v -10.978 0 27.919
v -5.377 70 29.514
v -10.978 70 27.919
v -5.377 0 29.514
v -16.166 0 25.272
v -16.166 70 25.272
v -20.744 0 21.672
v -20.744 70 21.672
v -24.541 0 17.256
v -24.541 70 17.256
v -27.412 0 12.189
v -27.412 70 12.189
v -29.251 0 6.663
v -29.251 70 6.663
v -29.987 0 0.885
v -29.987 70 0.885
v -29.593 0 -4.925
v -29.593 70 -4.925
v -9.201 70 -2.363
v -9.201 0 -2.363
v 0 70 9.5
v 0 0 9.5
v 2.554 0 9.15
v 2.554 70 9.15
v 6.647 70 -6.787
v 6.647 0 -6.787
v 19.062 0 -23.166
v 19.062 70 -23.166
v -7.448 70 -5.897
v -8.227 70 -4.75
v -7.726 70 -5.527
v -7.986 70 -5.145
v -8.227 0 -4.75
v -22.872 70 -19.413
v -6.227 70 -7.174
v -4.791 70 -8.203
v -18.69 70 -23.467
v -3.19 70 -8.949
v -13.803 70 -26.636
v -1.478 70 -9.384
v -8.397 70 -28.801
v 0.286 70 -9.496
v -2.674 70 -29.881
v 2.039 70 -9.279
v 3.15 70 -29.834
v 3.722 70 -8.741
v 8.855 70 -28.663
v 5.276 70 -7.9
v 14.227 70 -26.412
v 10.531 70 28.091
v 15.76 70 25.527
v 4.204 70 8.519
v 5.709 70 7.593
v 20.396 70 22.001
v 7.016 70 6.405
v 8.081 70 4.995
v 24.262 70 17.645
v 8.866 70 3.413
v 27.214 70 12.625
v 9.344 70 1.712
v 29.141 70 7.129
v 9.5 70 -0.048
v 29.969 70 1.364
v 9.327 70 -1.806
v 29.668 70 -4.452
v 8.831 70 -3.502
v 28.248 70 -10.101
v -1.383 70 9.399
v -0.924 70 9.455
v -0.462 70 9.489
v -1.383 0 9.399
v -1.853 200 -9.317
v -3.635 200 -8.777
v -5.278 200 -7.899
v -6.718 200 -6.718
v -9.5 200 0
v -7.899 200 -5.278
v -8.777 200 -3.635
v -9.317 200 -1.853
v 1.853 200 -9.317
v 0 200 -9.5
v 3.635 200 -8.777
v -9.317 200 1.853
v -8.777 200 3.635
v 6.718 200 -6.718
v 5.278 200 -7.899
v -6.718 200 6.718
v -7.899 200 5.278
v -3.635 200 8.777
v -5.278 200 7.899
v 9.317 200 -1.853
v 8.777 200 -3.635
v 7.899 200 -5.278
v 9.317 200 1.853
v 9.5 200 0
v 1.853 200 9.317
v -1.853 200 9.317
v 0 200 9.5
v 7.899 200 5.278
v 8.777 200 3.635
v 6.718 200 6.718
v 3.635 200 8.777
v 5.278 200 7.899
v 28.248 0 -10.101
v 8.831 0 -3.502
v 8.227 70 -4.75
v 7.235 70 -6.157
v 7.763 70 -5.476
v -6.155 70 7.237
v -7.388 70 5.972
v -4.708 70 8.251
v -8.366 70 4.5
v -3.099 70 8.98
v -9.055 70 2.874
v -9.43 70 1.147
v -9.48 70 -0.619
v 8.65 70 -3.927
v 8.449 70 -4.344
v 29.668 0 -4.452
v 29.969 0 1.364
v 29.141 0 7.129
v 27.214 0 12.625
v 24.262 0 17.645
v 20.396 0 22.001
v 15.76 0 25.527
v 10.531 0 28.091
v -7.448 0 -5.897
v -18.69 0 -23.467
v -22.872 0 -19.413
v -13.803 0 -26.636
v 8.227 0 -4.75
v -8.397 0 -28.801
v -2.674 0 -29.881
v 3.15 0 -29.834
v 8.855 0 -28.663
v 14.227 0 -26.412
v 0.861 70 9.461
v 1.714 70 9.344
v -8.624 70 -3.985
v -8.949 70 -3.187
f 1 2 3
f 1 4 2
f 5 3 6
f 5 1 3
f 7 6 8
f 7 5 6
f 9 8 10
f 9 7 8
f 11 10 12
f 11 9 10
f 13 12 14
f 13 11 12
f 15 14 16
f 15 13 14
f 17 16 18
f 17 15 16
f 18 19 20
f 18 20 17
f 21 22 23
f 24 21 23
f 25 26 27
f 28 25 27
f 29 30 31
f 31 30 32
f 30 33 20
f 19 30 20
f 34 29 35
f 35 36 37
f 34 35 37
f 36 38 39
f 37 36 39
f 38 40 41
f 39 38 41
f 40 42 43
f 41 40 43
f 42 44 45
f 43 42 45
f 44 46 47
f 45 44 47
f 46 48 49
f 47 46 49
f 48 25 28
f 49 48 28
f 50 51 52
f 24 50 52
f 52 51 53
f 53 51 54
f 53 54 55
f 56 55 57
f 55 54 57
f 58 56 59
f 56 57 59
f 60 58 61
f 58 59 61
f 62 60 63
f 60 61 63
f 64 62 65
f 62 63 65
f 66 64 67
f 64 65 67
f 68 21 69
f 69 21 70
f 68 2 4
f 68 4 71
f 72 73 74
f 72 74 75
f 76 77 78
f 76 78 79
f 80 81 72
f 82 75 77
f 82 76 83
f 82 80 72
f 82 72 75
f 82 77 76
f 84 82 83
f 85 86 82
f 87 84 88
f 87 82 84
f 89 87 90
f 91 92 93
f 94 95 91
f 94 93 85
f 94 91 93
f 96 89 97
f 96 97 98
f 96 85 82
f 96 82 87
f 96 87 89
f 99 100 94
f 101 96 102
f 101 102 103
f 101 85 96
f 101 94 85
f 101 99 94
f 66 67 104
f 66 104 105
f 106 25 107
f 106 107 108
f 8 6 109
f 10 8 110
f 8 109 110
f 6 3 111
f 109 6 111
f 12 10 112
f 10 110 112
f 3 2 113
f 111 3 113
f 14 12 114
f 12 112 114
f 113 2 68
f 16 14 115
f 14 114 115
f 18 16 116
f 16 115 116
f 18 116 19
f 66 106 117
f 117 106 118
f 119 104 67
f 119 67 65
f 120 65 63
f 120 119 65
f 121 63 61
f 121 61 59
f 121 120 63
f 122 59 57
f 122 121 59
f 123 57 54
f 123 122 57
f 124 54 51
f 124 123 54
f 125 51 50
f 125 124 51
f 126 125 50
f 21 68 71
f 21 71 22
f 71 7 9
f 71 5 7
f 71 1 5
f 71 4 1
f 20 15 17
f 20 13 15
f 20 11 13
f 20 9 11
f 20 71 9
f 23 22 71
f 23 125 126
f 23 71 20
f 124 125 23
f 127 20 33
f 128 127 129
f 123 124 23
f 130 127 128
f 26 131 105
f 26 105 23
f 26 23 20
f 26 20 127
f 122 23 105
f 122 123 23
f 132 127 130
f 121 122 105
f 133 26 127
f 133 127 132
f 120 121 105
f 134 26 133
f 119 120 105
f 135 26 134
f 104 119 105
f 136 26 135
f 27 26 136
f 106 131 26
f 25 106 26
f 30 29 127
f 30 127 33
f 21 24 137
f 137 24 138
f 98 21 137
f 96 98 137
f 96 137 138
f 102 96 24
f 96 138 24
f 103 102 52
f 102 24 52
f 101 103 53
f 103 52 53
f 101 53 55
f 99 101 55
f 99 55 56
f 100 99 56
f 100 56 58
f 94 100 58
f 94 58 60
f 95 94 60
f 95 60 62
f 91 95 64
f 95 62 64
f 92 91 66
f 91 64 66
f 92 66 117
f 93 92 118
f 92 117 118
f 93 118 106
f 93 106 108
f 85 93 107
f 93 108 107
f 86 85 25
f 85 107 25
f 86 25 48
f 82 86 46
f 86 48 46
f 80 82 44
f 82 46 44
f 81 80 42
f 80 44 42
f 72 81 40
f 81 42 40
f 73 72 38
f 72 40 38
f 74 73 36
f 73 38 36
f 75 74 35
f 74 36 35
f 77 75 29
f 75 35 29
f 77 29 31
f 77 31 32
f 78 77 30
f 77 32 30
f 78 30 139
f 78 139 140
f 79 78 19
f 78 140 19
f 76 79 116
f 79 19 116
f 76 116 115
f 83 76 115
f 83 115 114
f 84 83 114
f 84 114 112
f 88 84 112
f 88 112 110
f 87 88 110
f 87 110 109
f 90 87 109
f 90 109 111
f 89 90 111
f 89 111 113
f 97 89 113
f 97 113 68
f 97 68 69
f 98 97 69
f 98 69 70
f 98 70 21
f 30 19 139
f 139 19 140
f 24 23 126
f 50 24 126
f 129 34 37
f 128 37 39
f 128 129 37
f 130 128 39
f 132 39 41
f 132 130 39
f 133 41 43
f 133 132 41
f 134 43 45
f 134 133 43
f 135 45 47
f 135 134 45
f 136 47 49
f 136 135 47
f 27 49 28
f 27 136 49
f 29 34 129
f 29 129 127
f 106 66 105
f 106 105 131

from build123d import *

# Parameters (mm, degrees)
SKETCH1_R           = 9.5
BOSS_EXTRUDE1_DEPTH = 200
SKETCH2_R           = 30
SKETCH2_R_2         = 9.5
BOSS_EXTRUDE2_DEPTH = 70
CUT_EXTRUDE1_DEPTH  = 137.747943312
CIRPATTERN1_COUNT   = 3


with BuildPart() as part:
    # Sketch1 → Boss-Extrude1 (new body)
    with BuildSketch(Plane(origin=(0, 0, 0), x_dir=(1, 0, 0), z_dir=(0, 1, 0))):
        with Locations(Location((0, 0, 0), (0, 0, 270))):
            Circle(SKETCH1_R)
    extrude(amount=BOSS_EXTRUDE1_DEPTH)

    # Sketch2 → Boss-Extrude2 (add)
    with BuildSketch(Plane.XZ):
        with Locations(Location((0, 0, 0), (0, 0, 270))):
            Circle(SKETCH2_R)
        with Locations(Location((0, 0, 0), (0, 0, 270))):
            Circle(SKETCH2_R_2, mode=Mode.SUBTRACT)
    extrude(amount=-BOSS_EXTRUDE2_DEPTH)

    # Sketch3 → Cut-Extrude1 (cut, through all)
    with BuildSketch(Plane(origin=(0, 70, 0), x_dir=(1, 0, 0), z_dir=(0, 1, 0))):
        Polygon((-5.921460856, -32.258084995), (-1.382914739, -9.398805606), (0, -9.5), (2.553944051, -9.150266104), (12.286259273, -32.258084995), align=None)
    cut_extrude1 = extrude(amount=-CUT_EXTRUDE1_DEPTH, mode=Mode.SUBTRACT)

    # CirPattern1: Cut-Extrude1 ×3 about axis
    cirpattern1_axis = Axis((0, 0, 0), (0, 1, 0))
    for i in range(1, CIRPATTERN1_COUNT):
        add(cut_extrude1.rotate(cirpattern1_axis, i * 360 / CIRPATTERN1_COUNT), mode=Mode.SUBTRACT)


solid = part.part
